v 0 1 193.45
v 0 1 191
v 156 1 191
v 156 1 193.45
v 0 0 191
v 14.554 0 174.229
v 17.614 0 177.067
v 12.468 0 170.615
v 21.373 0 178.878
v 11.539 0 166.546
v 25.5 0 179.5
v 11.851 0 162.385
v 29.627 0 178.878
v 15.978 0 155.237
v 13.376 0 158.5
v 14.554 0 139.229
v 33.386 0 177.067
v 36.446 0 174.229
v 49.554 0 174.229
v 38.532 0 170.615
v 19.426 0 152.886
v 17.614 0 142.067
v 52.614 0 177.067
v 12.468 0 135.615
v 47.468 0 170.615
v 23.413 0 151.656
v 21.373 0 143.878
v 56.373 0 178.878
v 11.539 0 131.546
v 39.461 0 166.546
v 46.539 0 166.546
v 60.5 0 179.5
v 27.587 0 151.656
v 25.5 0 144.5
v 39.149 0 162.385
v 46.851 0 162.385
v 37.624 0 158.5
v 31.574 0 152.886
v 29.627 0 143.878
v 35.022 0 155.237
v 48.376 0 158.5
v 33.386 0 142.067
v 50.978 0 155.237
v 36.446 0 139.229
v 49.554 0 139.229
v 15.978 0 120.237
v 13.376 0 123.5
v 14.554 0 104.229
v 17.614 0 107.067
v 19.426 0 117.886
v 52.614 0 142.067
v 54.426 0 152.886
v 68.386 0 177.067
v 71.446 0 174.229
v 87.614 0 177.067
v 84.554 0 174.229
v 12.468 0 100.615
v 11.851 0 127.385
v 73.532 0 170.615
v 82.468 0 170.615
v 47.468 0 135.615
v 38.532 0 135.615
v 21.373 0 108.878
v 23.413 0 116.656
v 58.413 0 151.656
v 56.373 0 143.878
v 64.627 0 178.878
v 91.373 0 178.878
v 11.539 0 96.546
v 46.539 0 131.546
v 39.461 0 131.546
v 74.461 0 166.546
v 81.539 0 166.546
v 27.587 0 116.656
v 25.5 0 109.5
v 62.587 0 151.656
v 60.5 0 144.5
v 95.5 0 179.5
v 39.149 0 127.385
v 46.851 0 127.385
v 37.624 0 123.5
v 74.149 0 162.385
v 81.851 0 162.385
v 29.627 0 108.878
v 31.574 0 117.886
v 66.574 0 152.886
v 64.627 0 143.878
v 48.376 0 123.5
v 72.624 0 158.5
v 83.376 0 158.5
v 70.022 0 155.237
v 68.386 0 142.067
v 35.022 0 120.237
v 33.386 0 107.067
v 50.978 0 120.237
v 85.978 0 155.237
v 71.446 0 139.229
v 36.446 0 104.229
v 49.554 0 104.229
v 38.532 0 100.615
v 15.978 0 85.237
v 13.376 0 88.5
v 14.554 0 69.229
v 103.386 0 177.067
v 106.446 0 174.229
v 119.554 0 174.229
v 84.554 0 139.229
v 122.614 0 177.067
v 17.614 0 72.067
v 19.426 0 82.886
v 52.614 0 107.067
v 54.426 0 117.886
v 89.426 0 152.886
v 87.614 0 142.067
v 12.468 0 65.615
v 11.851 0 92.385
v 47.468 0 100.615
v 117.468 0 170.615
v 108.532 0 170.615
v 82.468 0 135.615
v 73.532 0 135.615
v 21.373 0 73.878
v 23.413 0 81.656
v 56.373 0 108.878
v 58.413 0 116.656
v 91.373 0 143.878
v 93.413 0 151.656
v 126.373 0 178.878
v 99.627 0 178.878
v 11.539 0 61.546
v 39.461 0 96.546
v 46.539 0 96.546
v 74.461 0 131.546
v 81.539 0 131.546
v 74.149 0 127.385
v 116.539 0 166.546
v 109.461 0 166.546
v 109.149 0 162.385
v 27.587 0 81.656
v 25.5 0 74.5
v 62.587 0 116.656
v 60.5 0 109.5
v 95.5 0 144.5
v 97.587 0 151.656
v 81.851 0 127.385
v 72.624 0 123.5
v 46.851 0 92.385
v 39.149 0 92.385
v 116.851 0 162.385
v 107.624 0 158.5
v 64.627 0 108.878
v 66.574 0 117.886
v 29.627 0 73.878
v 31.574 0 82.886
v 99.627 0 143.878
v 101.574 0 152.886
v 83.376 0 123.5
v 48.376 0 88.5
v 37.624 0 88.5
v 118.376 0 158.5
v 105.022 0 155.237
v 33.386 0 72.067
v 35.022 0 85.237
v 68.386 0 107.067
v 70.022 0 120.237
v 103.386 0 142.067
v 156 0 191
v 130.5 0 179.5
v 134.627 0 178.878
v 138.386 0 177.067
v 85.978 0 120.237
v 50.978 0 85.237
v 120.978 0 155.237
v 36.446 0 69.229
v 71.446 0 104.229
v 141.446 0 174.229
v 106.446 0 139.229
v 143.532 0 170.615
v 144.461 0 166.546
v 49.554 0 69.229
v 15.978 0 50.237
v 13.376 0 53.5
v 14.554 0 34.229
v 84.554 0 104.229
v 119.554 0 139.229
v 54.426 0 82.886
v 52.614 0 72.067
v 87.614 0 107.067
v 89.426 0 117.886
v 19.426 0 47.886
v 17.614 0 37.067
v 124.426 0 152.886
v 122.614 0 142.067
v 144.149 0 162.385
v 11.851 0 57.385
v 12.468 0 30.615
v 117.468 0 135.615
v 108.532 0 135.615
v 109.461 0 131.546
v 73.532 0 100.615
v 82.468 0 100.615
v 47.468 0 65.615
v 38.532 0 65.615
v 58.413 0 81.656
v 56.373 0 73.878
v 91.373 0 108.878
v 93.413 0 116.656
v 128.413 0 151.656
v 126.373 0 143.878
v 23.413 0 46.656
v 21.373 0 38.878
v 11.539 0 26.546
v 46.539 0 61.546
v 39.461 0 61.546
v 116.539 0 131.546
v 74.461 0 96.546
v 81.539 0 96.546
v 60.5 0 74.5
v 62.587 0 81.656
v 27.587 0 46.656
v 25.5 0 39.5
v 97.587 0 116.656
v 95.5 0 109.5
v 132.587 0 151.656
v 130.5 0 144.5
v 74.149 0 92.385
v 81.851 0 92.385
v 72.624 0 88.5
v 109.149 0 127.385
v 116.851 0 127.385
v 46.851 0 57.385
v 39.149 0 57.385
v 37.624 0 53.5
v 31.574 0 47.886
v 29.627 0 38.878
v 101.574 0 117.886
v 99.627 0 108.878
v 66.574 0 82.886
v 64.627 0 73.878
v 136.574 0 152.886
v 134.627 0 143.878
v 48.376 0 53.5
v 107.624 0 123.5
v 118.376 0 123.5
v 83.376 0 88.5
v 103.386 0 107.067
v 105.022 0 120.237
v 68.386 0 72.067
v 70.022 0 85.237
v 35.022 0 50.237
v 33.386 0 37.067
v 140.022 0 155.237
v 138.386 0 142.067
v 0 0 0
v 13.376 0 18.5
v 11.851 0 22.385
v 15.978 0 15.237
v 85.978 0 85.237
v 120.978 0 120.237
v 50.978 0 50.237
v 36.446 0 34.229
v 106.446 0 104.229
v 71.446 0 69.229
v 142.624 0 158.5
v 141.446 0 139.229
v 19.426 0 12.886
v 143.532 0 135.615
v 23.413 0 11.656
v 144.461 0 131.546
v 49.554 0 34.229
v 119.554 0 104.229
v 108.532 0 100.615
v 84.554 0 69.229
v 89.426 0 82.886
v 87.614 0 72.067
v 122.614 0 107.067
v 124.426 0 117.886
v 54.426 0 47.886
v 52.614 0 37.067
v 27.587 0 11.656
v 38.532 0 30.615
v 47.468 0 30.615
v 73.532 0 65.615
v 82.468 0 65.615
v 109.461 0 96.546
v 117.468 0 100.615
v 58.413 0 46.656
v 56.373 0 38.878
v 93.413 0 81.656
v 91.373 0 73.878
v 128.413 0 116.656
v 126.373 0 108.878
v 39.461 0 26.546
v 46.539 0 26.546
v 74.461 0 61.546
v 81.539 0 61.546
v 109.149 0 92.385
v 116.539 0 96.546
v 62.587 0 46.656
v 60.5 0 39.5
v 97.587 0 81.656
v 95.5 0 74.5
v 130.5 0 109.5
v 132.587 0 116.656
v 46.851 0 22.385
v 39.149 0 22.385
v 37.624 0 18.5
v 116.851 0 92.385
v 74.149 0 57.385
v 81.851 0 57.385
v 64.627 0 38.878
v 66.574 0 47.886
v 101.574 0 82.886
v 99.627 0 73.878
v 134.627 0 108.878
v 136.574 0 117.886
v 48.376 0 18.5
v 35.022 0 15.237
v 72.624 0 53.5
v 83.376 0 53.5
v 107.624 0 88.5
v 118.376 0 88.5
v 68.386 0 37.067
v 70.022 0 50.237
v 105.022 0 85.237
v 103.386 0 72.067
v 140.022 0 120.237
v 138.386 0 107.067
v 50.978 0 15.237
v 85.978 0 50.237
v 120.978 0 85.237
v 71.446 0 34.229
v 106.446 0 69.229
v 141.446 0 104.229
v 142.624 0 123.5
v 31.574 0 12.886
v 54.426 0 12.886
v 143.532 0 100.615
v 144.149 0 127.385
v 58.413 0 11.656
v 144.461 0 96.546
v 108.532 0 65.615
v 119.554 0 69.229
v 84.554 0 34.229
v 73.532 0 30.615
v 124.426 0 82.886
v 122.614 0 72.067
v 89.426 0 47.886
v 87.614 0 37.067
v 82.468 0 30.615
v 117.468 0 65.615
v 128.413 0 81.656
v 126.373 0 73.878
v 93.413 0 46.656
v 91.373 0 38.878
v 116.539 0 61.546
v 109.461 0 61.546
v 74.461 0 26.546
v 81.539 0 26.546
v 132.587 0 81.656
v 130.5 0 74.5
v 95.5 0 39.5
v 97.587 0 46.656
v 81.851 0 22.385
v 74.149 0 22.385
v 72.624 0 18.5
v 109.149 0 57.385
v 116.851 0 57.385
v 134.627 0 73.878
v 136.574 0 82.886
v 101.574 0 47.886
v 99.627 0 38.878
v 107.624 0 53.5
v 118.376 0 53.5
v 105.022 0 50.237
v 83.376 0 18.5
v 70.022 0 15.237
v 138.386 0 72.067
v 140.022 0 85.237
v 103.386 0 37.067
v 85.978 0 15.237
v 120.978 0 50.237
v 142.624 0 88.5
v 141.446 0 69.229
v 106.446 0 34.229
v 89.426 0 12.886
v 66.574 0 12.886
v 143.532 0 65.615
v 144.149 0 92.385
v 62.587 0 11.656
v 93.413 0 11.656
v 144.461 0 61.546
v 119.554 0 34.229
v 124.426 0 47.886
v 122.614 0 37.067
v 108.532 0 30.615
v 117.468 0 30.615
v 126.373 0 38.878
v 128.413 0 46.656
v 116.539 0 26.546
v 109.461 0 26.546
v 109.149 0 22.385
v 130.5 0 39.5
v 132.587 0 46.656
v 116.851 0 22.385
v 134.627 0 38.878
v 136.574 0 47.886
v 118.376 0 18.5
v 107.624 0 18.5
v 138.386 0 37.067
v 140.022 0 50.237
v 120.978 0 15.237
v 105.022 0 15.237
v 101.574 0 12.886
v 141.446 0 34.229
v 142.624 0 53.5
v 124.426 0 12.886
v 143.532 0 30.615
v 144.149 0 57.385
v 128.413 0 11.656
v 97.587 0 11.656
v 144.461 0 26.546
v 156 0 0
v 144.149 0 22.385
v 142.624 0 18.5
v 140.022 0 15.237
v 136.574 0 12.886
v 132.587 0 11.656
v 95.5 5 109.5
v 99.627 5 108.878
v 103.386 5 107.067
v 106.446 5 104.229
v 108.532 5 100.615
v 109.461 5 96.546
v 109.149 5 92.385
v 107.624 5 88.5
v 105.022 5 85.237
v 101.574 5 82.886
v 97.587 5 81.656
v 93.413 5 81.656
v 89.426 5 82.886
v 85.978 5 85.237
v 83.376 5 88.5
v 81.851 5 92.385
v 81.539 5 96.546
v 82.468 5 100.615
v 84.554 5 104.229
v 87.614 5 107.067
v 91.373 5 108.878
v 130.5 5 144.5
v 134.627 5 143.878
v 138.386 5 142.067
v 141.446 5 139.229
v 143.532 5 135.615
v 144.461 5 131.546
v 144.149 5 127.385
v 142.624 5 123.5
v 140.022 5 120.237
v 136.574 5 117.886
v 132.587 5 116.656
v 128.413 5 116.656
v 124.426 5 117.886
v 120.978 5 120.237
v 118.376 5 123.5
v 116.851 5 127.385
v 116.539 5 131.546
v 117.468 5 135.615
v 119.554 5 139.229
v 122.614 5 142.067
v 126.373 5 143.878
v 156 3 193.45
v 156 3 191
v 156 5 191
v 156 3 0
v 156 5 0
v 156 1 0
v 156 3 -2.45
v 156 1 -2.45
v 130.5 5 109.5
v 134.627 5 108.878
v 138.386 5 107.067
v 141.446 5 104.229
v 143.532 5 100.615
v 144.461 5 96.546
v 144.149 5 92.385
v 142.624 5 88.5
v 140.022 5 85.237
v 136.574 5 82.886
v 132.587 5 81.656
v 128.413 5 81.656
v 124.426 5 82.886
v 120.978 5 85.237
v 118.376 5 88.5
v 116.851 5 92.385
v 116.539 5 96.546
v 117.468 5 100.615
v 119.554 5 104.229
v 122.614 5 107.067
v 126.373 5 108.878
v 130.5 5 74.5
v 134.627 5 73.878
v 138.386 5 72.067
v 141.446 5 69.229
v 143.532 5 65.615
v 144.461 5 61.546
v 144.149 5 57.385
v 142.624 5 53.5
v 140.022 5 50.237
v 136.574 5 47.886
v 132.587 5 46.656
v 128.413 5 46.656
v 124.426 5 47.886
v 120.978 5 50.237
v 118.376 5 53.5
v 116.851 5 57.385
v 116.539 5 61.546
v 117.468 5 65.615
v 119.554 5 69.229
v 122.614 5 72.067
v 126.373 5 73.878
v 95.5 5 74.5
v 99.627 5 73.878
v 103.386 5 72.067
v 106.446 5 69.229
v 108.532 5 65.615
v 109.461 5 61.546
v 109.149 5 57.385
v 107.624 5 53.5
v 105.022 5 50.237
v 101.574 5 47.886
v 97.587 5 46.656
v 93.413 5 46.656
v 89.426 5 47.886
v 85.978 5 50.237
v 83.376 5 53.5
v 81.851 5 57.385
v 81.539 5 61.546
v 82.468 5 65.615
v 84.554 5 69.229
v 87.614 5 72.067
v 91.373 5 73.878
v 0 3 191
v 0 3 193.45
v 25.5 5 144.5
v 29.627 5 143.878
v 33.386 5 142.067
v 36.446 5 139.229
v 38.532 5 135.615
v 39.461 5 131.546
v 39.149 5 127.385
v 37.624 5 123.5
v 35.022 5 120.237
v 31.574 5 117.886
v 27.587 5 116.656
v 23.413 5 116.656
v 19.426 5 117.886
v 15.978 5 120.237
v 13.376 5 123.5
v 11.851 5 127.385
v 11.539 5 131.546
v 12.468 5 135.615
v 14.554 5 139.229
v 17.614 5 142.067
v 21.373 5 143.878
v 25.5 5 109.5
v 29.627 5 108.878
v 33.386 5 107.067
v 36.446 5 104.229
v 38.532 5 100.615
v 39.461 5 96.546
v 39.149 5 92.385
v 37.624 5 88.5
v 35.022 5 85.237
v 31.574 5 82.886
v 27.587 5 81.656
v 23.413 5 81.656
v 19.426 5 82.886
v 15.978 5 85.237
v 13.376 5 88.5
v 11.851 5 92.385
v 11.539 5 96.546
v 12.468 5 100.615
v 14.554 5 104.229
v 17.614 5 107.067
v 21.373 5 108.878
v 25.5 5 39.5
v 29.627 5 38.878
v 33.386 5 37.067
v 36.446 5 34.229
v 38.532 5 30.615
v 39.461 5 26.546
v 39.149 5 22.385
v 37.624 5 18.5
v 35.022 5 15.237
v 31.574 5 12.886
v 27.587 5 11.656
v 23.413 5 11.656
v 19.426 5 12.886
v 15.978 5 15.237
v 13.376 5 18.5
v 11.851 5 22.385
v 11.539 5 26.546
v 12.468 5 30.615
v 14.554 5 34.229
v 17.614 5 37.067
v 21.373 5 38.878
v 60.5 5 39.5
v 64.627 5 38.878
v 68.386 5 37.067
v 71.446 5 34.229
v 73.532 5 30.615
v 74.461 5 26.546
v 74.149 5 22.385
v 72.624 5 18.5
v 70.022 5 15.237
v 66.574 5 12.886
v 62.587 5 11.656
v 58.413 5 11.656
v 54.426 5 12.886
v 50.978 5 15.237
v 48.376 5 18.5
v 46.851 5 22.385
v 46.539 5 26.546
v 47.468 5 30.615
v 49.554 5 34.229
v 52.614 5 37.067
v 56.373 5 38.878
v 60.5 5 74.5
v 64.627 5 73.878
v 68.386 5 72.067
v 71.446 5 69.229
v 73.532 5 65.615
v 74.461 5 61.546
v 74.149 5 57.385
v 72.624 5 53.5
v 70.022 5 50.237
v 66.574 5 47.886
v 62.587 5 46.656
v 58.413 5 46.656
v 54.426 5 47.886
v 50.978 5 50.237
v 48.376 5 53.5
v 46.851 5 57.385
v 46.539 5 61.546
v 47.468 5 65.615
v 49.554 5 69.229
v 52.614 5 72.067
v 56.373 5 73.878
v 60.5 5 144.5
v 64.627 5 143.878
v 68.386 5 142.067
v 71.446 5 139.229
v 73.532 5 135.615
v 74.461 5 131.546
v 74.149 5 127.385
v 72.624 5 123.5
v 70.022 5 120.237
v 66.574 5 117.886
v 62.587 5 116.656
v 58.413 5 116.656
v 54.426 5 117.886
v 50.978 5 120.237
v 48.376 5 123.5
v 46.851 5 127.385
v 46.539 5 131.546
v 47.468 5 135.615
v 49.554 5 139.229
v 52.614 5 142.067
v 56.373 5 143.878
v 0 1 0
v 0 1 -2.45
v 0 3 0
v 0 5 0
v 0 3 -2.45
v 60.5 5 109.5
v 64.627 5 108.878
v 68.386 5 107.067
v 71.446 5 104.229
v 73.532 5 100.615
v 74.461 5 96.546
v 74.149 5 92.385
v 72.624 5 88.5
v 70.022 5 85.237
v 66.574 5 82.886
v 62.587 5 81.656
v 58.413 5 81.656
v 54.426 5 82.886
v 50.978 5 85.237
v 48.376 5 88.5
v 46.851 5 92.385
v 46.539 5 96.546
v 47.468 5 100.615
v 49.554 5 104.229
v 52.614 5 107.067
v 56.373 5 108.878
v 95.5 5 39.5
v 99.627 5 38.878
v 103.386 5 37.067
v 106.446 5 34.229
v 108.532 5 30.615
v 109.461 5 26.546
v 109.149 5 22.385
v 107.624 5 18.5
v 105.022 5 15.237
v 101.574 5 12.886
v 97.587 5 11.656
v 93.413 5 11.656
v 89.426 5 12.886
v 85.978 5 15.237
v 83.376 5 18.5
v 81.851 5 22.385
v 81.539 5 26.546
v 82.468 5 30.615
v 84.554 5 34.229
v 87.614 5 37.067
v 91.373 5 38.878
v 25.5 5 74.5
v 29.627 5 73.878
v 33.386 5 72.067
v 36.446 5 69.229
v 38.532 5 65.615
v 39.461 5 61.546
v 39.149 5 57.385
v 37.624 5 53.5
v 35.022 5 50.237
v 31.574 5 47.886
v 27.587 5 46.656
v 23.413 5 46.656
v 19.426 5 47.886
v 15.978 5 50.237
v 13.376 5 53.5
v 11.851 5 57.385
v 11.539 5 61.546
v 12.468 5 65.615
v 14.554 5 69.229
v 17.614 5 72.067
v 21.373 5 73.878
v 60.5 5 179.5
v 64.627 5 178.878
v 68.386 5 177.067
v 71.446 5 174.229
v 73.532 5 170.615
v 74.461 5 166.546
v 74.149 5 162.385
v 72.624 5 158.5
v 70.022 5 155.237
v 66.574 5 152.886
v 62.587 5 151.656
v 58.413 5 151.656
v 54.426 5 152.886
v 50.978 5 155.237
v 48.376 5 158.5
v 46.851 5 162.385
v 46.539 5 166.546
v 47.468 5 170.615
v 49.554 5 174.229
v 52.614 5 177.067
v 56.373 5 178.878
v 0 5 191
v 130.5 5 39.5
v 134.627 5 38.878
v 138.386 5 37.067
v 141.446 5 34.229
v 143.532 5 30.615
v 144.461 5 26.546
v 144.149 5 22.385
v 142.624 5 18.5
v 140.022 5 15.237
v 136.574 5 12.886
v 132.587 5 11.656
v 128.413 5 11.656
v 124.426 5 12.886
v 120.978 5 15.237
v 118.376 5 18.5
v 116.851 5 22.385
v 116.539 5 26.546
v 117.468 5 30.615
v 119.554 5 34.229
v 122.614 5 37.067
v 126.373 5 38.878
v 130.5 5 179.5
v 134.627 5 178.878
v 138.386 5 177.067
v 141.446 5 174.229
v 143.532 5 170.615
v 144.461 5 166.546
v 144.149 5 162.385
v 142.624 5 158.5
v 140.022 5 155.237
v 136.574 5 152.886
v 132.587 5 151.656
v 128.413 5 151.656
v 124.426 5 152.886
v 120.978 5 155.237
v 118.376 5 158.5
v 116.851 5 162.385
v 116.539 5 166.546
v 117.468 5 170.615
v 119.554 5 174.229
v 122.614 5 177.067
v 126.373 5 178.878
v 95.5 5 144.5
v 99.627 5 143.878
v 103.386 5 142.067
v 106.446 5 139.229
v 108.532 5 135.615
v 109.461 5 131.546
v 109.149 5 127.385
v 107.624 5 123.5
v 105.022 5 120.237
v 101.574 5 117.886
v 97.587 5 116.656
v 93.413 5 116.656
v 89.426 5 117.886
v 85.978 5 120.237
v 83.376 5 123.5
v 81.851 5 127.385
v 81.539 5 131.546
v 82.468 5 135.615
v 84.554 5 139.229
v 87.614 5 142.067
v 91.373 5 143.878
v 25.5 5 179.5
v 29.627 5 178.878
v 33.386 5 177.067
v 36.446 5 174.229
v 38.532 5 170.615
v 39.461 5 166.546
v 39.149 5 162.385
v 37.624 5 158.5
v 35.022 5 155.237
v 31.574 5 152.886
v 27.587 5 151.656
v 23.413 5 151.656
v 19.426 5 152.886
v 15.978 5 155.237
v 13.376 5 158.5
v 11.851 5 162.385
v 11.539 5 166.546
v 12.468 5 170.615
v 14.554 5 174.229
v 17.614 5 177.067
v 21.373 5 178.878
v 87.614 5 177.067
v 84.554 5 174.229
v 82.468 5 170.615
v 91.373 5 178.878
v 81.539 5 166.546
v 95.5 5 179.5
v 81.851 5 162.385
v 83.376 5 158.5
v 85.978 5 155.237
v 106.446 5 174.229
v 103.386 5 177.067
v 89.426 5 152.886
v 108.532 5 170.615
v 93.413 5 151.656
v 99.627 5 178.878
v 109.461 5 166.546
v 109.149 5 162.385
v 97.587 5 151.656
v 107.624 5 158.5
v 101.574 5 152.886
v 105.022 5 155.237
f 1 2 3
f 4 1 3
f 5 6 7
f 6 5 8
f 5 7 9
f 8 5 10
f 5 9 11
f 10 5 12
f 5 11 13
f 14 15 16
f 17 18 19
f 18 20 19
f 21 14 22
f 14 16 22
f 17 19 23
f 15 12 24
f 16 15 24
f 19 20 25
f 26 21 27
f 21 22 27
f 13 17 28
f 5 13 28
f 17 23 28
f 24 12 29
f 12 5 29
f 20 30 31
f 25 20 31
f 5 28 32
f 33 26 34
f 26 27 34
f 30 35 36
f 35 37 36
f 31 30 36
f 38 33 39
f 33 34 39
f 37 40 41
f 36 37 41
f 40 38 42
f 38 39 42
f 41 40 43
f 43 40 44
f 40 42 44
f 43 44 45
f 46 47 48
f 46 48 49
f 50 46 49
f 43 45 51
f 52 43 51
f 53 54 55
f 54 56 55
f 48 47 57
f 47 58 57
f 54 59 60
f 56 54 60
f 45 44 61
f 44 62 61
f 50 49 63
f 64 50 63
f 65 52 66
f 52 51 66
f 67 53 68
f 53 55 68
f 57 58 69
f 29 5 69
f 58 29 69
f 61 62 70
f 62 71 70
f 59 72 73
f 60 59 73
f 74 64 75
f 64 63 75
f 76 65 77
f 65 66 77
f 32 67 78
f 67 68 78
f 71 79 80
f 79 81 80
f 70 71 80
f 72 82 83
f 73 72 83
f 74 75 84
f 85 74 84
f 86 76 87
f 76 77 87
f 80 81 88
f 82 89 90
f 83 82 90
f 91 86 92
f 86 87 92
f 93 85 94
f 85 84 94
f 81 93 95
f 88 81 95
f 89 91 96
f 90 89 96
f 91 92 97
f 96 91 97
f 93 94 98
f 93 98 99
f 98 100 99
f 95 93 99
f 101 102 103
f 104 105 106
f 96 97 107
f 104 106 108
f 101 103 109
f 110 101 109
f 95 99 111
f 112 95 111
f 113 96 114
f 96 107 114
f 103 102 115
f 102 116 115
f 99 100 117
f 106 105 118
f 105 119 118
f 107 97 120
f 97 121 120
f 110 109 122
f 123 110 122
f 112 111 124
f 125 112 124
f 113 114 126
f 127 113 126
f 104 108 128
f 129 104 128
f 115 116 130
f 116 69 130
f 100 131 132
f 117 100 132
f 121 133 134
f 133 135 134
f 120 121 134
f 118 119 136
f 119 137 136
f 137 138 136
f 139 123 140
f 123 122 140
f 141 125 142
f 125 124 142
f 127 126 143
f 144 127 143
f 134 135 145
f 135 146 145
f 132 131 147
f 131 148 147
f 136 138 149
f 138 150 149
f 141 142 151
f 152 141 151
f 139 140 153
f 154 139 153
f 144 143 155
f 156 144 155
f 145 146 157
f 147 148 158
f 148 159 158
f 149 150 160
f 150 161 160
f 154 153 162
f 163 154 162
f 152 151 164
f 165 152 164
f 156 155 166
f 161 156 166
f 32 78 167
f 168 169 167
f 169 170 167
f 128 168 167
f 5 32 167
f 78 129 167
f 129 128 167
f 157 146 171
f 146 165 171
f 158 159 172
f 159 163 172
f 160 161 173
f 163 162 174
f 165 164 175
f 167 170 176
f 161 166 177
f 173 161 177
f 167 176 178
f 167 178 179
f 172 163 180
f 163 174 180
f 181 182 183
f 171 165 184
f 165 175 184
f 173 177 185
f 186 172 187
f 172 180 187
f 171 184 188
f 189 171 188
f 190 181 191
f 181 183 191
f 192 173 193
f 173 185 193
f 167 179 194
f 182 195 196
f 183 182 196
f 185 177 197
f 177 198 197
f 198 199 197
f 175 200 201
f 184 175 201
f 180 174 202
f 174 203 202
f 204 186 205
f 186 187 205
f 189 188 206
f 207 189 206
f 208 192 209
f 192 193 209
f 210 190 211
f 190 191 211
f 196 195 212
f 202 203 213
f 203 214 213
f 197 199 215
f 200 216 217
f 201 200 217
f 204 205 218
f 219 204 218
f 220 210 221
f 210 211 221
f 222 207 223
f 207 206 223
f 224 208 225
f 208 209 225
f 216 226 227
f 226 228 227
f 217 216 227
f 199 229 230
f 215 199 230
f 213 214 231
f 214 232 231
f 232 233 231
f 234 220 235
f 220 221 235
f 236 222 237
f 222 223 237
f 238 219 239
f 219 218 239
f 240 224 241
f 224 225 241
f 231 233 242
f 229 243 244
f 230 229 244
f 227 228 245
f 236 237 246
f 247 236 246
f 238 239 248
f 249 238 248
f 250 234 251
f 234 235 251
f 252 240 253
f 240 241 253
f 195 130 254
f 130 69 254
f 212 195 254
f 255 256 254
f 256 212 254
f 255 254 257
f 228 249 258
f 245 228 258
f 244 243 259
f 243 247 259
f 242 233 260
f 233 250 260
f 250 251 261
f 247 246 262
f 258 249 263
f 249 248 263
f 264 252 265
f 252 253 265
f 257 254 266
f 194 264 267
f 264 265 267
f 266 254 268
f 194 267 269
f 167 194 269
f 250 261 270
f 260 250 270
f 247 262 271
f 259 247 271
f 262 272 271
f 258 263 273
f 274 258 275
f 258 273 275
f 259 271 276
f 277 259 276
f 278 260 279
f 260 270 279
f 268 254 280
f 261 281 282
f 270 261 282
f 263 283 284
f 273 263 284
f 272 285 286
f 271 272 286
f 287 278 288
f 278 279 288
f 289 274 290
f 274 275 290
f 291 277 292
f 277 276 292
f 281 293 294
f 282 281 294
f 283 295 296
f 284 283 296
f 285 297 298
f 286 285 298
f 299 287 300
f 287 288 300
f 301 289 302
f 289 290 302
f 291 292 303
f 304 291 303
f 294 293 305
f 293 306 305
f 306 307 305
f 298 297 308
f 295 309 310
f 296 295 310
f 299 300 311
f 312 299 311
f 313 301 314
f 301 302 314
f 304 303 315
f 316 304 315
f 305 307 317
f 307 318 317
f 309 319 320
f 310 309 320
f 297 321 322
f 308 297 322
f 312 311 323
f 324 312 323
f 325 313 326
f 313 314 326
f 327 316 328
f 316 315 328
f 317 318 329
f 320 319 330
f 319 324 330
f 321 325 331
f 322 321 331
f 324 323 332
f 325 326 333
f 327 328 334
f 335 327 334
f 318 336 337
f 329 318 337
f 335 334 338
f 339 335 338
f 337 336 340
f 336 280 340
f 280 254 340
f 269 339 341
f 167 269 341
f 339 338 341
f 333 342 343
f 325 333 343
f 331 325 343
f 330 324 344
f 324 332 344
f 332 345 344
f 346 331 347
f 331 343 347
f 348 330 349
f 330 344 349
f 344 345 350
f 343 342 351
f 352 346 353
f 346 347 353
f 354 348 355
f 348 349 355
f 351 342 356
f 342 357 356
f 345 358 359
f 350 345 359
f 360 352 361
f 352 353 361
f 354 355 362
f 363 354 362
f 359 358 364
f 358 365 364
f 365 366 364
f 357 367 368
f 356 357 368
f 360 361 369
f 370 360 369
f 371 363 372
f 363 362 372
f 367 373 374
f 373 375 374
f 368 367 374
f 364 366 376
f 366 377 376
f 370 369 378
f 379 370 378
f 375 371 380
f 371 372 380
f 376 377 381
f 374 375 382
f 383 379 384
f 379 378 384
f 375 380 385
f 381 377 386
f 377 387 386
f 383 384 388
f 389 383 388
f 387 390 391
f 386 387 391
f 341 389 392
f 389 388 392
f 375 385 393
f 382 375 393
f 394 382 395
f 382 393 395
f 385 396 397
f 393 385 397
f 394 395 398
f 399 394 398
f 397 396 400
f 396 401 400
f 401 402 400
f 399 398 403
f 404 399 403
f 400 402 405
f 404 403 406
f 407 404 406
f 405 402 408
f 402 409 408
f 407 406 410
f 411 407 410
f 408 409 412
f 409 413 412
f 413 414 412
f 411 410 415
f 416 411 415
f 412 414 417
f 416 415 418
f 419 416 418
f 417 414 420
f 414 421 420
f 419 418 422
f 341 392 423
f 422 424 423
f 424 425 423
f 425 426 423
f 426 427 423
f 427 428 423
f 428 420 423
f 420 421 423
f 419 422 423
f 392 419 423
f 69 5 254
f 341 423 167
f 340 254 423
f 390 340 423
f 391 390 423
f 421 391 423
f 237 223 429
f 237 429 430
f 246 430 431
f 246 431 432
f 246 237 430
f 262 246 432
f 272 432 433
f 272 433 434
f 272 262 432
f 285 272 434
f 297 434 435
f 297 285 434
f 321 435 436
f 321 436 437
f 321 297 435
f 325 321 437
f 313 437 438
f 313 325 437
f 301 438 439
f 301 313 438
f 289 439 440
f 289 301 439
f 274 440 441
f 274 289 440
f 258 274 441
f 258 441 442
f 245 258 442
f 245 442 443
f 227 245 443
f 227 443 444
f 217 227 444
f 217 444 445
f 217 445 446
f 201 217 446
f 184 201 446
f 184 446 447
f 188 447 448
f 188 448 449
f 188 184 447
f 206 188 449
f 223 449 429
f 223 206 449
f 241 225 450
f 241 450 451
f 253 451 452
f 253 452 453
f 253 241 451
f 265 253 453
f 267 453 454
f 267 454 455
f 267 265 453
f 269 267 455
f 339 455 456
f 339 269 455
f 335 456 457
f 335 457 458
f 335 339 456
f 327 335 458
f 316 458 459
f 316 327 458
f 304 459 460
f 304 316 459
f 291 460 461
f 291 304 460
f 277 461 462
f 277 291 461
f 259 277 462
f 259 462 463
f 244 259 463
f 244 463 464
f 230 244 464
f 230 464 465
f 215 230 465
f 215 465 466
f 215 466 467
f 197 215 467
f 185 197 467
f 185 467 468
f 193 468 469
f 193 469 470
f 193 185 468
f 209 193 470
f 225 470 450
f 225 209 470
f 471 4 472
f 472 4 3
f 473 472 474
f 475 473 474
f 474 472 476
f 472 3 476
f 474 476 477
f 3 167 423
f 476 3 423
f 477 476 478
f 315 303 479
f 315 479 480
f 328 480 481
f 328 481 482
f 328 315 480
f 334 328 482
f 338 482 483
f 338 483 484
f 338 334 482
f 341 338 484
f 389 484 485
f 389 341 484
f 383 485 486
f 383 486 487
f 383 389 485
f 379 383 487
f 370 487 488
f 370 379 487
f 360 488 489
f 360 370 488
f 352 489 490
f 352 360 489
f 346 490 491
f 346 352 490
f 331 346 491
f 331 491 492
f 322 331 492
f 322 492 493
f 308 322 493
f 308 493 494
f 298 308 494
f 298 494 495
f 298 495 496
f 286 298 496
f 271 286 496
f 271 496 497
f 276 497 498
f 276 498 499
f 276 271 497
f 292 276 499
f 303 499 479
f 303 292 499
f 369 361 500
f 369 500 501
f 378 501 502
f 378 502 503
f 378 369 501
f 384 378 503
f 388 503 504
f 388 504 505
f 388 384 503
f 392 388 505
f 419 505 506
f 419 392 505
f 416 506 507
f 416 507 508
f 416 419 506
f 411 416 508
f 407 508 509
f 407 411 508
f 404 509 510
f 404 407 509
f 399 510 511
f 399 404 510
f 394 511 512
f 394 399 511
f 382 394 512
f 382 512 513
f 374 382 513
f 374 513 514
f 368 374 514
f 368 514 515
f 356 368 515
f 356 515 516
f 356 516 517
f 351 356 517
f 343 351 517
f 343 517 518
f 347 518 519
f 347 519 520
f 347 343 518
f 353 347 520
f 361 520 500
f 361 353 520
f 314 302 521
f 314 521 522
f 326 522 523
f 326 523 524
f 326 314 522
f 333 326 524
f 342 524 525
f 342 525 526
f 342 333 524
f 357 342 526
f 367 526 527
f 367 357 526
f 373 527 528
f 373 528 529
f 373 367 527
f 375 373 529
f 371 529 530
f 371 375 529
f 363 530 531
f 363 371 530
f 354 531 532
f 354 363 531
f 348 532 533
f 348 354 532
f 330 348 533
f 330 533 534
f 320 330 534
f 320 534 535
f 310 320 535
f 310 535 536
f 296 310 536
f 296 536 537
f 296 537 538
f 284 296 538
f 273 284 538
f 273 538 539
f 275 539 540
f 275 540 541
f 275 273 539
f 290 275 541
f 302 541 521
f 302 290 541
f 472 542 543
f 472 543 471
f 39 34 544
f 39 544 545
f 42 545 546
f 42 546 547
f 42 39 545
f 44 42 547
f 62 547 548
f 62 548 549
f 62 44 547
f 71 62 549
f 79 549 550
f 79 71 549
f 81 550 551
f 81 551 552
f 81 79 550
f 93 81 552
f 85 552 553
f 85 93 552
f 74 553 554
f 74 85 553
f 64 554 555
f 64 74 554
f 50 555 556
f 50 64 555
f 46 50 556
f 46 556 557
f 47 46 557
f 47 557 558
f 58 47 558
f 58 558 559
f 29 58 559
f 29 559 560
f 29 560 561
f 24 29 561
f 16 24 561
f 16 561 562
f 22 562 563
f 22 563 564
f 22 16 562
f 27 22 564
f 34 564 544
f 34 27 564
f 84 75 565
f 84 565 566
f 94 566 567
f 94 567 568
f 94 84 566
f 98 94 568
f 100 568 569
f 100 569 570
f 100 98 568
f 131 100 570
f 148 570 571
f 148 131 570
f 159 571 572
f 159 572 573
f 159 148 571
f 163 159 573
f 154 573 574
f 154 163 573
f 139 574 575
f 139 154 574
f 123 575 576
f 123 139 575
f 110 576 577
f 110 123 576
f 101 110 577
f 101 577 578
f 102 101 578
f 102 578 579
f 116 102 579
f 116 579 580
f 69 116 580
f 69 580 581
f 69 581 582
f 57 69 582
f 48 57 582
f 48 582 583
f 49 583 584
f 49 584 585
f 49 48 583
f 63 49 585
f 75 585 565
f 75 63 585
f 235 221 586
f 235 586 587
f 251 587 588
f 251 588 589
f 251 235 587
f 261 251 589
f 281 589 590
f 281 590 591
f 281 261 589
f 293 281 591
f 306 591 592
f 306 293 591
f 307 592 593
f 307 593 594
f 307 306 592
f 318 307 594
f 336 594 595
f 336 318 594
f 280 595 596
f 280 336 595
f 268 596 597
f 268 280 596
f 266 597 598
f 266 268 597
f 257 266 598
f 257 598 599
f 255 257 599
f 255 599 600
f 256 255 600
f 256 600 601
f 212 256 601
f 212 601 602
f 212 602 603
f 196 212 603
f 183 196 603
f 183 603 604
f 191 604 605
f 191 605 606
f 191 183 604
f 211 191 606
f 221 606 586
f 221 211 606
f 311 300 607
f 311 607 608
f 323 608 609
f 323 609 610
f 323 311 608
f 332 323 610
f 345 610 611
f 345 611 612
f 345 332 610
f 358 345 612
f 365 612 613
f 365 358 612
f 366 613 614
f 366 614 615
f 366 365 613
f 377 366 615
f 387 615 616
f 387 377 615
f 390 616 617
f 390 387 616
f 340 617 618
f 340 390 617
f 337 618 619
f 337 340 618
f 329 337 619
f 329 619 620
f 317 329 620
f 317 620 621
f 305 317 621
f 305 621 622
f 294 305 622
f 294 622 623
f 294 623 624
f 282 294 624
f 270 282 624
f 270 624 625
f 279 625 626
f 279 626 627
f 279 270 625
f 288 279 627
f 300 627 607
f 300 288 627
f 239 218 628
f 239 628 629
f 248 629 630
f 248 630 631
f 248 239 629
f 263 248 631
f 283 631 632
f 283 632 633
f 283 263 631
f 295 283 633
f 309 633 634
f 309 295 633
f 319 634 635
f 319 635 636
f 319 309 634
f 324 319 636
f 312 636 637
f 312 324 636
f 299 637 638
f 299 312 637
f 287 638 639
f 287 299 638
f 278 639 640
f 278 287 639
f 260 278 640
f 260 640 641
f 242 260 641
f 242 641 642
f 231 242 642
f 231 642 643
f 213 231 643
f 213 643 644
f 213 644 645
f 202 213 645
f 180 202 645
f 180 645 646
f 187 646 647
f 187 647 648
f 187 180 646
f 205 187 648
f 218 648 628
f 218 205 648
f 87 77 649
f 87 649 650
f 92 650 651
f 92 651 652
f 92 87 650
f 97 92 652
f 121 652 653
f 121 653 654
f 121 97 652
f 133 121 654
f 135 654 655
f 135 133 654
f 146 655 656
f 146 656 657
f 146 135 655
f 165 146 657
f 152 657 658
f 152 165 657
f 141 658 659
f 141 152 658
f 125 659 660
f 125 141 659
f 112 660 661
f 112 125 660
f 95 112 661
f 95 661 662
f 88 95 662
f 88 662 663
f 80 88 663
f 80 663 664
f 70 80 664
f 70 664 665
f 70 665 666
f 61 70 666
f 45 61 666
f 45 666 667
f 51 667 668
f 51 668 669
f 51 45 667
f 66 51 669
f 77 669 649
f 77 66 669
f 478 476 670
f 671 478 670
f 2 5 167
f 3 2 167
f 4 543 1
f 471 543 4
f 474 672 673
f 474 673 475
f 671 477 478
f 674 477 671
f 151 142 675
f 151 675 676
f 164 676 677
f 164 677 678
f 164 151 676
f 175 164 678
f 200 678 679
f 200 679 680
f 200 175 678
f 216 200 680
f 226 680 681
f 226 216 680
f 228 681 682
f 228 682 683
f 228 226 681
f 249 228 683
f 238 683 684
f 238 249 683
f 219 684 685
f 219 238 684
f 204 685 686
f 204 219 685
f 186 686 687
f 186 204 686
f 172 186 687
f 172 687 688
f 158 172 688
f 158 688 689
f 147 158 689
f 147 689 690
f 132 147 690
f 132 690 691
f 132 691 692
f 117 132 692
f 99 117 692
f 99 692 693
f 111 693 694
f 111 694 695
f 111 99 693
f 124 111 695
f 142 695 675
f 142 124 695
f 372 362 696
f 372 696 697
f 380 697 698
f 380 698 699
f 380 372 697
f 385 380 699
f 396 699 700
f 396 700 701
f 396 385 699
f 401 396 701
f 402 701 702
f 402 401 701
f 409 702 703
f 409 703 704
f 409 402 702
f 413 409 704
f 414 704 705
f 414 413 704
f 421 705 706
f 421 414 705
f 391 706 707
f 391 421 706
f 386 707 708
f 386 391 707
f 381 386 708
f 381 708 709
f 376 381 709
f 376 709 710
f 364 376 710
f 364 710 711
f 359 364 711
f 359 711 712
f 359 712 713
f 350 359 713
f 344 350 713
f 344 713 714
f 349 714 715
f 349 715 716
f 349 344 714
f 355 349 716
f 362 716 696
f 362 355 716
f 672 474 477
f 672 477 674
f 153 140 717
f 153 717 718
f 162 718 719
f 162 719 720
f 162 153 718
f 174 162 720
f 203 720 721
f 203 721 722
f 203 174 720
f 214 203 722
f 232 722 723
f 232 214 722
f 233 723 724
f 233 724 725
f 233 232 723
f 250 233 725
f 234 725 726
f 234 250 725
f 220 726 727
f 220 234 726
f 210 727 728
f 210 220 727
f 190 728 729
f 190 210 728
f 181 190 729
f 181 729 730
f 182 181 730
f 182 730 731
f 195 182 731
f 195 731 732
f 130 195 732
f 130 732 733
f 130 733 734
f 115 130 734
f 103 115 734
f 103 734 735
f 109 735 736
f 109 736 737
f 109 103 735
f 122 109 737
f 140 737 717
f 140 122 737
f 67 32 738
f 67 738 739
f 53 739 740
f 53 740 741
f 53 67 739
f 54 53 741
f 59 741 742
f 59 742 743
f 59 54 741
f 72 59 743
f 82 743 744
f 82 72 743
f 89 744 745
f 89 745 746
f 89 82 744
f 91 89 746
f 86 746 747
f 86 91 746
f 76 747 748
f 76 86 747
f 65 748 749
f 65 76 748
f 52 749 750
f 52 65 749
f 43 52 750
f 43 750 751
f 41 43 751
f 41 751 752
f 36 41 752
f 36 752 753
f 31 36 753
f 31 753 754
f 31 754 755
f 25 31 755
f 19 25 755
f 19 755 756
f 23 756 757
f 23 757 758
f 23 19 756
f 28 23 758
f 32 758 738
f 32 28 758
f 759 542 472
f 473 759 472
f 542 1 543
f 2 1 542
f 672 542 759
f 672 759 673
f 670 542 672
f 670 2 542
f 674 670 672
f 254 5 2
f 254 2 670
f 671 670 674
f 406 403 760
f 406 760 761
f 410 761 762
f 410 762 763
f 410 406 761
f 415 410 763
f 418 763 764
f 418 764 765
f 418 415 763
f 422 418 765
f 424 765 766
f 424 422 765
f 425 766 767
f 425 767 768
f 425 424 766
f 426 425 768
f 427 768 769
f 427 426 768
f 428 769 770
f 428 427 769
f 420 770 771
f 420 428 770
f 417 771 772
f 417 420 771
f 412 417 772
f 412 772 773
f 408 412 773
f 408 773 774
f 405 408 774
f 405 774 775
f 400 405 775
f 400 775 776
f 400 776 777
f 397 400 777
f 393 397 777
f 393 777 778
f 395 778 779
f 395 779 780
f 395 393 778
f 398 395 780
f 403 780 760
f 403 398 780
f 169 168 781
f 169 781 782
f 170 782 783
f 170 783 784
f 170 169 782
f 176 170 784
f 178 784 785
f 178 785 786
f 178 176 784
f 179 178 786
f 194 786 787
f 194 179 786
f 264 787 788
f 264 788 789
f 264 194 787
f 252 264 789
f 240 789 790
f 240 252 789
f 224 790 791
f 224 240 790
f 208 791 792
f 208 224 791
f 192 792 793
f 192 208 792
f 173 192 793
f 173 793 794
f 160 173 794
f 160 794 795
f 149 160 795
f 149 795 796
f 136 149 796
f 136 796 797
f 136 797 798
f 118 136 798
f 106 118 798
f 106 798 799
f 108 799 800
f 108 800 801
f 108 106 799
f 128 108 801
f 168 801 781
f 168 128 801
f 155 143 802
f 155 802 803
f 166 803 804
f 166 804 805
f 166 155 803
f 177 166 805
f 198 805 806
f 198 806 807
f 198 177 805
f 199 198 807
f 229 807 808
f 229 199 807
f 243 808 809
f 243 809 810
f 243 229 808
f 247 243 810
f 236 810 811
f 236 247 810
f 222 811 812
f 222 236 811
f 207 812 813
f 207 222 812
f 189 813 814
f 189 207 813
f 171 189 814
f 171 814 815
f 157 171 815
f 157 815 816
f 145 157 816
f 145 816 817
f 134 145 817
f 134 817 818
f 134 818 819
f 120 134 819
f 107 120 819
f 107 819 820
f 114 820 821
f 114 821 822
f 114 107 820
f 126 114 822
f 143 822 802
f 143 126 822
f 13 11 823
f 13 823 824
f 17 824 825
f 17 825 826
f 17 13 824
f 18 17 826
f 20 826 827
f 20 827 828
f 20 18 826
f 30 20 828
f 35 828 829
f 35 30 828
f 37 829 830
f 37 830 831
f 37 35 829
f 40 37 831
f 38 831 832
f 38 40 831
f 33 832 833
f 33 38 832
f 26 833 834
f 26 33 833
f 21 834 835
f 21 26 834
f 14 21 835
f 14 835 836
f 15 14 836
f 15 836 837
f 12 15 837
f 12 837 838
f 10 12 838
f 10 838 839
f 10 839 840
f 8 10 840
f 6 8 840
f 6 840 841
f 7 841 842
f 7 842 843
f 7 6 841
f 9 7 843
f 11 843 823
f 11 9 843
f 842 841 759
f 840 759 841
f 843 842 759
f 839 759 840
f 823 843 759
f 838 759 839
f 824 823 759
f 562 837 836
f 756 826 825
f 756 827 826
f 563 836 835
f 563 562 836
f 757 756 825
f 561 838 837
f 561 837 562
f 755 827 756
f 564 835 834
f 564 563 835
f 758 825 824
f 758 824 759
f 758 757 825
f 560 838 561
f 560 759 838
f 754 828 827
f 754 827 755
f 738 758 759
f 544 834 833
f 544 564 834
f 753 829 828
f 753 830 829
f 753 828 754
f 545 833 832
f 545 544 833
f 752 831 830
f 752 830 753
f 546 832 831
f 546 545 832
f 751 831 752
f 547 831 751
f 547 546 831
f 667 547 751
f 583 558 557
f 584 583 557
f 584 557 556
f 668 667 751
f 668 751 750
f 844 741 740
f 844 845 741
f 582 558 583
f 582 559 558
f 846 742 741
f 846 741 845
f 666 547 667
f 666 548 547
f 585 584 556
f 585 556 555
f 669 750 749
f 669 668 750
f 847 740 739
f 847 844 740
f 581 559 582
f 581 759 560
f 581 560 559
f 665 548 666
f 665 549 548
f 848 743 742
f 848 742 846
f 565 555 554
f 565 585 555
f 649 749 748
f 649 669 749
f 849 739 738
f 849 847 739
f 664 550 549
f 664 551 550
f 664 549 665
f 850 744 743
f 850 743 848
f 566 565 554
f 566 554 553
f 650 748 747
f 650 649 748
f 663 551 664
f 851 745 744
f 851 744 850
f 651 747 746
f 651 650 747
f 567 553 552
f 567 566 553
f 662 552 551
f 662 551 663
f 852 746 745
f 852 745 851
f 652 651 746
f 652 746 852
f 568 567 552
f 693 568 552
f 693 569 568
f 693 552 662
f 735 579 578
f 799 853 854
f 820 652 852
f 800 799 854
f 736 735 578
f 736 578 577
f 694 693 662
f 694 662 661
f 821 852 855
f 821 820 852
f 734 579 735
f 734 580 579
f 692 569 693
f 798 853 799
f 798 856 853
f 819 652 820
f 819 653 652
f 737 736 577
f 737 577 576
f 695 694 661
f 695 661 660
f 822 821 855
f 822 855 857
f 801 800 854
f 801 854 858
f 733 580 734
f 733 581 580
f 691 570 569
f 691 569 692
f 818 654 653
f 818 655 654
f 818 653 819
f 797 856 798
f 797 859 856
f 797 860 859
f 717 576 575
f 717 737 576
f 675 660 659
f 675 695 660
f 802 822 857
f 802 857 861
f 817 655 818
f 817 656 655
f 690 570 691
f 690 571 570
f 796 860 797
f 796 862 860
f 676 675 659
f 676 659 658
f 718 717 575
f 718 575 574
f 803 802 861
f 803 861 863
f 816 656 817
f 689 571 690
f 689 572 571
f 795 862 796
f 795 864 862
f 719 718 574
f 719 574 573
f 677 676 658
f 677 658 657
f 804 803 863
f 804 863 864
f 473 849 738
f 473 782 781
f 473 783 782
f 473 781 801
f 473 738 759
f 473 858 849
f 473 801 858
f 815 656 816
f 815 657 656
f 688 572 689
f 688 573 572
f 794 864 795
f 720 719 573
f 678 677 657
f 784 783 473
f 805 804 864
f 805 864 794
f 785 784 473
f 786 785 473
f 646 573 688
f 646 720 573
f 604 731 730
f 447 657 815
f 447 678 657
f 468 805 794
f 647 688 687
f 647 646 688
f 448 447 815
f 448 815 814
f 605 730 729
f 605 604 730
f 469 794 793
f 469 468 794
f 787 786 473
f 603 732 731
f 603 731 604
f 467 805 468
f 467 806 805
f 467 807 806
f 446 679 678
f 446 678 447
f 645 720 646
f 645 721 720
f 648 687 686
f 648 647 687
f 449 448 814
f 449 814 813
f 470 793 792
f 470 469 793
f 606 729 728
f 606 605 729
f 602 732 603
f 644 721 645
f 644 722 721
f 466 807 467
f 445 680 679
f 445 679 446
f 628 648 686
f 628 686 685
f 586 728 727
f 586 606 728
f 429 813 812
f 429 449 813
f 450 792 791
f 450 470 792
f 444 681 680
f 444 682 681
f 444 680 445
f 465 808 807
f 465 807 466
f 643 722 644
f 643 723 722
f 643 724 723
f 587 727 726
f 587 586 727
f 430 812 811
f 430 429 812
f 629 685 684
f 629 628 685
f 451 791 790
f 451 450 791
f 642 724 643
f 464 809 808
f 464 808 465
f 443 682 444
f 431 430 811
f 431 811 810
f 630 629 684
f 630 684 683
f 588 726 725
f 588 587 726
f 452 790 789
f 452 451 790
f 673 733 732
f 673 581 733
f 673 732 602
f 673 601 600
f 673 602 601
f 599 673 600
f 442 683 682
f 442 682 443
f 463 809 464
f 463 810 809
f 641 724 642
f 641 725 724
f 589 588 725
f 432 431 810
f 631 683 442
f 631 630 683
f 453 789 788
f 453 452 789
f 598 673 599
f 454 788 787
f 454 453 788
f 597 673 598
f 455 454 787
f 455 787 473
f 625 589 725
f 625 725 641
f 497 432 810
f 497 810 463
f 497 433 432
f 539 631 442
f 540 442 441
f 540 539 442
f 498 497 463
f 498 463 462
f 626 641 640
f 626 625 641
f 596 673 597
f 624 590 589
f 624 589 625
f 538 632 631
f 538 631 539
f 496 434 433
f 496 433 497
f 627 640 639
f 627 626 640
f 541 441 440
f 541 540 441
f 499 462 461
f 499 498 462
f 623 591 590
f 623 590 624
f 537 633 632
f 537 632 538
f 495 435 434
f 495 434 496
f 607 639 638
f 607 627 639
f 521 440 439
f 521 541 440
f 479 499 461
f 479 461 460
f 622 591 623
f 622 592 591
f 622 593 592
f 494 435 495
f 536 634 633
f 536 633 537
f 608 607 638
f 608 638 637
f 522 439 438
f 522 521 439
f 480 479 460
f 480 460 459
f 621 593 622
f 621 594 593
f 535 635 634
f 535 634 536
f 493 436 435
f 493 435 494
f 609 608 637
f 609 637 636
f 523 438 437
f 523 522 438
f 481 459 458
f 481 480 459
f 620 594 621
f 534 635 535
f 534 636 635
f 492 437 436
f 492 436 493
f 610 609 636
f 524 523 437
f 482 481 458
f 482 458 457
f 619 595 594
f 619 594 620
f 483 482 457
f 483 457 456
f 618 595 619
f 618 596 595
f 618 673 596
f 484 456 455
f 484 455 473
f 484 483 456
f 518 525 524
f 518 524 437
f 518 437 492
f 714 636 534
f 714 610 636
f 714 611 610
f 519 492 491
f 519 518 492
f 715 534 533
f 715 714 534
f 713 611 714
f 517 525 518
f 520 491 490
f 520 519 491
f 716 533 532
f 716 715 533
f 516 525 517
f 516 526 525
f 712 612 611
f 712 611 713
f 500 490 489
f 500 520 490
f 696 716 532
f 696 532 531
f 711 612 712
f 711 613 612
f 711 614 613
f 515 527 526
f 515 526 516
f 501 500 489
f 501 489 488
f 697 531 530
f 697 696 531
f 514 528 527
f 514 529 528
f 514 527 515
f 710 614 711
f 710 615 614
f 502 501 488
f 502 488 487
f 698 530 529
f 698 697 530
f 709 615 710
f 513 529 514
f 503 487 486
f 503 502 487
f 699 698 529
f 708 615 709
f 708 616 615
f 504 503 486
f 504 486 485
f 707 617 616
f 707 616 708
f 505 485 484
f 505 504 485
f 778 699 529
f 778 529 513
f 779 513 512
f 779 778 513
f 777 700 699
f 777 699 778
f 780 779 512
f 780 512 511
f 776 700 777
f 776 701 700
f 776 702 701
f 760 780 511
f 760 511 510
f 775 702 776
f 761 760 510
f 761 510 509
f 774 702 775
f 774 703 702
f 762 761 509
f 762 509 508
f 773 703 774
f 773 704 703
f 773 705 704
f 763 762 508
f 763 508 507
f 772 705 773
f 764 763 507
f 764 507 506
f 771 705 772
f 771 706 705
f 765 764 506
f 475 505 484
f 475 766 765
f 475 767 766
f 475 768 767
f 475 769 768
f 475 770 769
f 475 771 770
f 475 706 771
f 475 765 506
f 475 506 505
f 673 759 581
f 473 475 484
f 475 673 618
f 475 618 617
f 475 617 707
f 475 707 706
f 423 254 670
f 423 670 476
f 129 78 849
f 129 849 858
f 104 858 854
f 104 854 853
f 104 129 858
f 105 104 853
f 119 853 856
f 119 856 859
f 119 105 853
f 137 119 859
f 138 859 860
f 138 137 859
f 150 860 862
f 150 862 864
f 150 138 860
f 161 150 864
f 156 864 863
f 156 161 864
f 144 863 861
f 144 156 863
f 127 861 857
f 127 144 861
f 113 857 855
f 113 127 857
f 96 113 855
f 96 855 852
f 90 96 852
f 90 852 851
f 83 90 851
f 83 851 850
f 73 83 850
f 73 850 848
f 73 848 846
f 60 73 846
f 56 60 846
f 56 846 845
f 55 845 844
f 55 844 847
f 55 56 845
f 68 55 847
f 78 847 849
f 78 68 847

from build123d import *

# Parameters (mm, degrees)
SKETCH1_W           = 156
SKETCH1_H           = 191
SKETCH1_R           = 14
BOSS_EXTRUDE1_DEPTH = 5
SKETCH2_W           = 156
SKETCH2_H           = 2
BOSS_EXTRUDE2_DEPTH = 2.45
SKETCH3_W           = 156
SKETCH3_H           = 2
BOSS_EXTRUDE3_DEPTH = 2.45


with BuildPart() as part:
    # Sketch1 → Boss-Extrude1 (new body)
    with BuildSketch(Plane(origin=(0, 0, 0), x_dir=(1, 0, 0), z_dir=(0, 1, 0))):
        with Locations((78, -95.5)):
            Rectangle(SKETCH1_W, SKETCH1_H)
        with Locations((25.5, -165.5)):
            Circle(SKETCH1_R, mode=Mode.SUBTRACT)
        with Locations((60.5, -165.5)):
            Circle(SKETCH1_R, mode=Mode.SUBTRACT)
        with Locations((95.5, -165.5)):
            Circle(SKETCH1_R, mode=Mode.SUBTRACT)
        with Locations((130.5, -165.5)):
            Circle(SKETCH1_R, mode=Mode.SUBTRACT)
        with Locations((60.5, -130.5)):
            Circle(SKETCH1_R, mode=Mode.SUBTRACT)
        with Locations((95.5, -130.5)):
            Circle(SKETCH1_R, mode=Mode.SUBTRACT)
        with Locations((130.5, -130.5)):
            Circle(SKETCH1_R, mode=Mode.SUBTRACT)
        with Locations((60.5, -95.5)):
            Circle(SKETCH1_R, mode=Mode.SUBTRACT)
        with Locations((95.5, -95.5)):
            Circle(SKETCH1_R, mode=Mode.SUBTRACT)
        with Locations((130.5, -95.5)):
            Circle(SKETCH1_R, mode=Mode.SUBTRACT)
        with Locations((60.5, -60.5)):
            Circle(SKETCH1_R, mode=Mode.SUBTRACT)
        with Locations((95.5, -60.5)):
            Circle(SKETCH1_R, mode=Mode.SUBTRACT)
        with Locations((130.5, -60.5)):
            Circle(SKETCH1_R, mode=Mode.SUBTRACT)
        with Locations((60.5, -25.5)):
            Circle(SKETCH1_R, mode=Mode.SUBTRACT)
        with Locations((95.5, -25.5)):
            Circle(SKETCH1_R, mode=Mode.SUBTRACT)
        with Locations((130.5, -25.5)):
            Circle(SKETCH1_R, mode=Mode.SUBTRACT)
        with Locations((25.5, -130.5)):
            Circle(SKETCH1_R, mode=Mode.SUBTRACT)
        with Locations((25.5, -95.5)):
            Circle(SKETCH1_R, mode=Mode.SUBTRACT)
        with Locations((25.5, -60.5)):
            Circle(SKETCH1_R, mode=Mode.SUBTRACT)
        with Locations((25.5, -25.5)):
            Circle(SKETCH1_R, mode=Mode.SUBTRACT)
    extrude(amount=BOSS_EXTRUDE1_DEPTH)

    # Sketch2 → Boss-Extrude2 (add)
    with BuildSketch(Plane.XY.offset(191)):
        with Locations((78, 2)):
            Rectangle(SKETCH2_W, SKETCH2_H)
    extrude(amount=BOSS_EXTRUDE2_DEPTH)

    # Sketch3 → Boss-Extrude3 (add)
    with BuildSketch(Plane(origin=(0, 0, 0), x_dir=(-1, 0, 0), z_dir=(0, 0, -1))):
        with Locations((-78, 2)):
            Rectangle(SKETCH3_W, SKETCH3_H)
    extrude(amount=BOSS_EXTRUDE3_DEPTH)


solid = part.part
